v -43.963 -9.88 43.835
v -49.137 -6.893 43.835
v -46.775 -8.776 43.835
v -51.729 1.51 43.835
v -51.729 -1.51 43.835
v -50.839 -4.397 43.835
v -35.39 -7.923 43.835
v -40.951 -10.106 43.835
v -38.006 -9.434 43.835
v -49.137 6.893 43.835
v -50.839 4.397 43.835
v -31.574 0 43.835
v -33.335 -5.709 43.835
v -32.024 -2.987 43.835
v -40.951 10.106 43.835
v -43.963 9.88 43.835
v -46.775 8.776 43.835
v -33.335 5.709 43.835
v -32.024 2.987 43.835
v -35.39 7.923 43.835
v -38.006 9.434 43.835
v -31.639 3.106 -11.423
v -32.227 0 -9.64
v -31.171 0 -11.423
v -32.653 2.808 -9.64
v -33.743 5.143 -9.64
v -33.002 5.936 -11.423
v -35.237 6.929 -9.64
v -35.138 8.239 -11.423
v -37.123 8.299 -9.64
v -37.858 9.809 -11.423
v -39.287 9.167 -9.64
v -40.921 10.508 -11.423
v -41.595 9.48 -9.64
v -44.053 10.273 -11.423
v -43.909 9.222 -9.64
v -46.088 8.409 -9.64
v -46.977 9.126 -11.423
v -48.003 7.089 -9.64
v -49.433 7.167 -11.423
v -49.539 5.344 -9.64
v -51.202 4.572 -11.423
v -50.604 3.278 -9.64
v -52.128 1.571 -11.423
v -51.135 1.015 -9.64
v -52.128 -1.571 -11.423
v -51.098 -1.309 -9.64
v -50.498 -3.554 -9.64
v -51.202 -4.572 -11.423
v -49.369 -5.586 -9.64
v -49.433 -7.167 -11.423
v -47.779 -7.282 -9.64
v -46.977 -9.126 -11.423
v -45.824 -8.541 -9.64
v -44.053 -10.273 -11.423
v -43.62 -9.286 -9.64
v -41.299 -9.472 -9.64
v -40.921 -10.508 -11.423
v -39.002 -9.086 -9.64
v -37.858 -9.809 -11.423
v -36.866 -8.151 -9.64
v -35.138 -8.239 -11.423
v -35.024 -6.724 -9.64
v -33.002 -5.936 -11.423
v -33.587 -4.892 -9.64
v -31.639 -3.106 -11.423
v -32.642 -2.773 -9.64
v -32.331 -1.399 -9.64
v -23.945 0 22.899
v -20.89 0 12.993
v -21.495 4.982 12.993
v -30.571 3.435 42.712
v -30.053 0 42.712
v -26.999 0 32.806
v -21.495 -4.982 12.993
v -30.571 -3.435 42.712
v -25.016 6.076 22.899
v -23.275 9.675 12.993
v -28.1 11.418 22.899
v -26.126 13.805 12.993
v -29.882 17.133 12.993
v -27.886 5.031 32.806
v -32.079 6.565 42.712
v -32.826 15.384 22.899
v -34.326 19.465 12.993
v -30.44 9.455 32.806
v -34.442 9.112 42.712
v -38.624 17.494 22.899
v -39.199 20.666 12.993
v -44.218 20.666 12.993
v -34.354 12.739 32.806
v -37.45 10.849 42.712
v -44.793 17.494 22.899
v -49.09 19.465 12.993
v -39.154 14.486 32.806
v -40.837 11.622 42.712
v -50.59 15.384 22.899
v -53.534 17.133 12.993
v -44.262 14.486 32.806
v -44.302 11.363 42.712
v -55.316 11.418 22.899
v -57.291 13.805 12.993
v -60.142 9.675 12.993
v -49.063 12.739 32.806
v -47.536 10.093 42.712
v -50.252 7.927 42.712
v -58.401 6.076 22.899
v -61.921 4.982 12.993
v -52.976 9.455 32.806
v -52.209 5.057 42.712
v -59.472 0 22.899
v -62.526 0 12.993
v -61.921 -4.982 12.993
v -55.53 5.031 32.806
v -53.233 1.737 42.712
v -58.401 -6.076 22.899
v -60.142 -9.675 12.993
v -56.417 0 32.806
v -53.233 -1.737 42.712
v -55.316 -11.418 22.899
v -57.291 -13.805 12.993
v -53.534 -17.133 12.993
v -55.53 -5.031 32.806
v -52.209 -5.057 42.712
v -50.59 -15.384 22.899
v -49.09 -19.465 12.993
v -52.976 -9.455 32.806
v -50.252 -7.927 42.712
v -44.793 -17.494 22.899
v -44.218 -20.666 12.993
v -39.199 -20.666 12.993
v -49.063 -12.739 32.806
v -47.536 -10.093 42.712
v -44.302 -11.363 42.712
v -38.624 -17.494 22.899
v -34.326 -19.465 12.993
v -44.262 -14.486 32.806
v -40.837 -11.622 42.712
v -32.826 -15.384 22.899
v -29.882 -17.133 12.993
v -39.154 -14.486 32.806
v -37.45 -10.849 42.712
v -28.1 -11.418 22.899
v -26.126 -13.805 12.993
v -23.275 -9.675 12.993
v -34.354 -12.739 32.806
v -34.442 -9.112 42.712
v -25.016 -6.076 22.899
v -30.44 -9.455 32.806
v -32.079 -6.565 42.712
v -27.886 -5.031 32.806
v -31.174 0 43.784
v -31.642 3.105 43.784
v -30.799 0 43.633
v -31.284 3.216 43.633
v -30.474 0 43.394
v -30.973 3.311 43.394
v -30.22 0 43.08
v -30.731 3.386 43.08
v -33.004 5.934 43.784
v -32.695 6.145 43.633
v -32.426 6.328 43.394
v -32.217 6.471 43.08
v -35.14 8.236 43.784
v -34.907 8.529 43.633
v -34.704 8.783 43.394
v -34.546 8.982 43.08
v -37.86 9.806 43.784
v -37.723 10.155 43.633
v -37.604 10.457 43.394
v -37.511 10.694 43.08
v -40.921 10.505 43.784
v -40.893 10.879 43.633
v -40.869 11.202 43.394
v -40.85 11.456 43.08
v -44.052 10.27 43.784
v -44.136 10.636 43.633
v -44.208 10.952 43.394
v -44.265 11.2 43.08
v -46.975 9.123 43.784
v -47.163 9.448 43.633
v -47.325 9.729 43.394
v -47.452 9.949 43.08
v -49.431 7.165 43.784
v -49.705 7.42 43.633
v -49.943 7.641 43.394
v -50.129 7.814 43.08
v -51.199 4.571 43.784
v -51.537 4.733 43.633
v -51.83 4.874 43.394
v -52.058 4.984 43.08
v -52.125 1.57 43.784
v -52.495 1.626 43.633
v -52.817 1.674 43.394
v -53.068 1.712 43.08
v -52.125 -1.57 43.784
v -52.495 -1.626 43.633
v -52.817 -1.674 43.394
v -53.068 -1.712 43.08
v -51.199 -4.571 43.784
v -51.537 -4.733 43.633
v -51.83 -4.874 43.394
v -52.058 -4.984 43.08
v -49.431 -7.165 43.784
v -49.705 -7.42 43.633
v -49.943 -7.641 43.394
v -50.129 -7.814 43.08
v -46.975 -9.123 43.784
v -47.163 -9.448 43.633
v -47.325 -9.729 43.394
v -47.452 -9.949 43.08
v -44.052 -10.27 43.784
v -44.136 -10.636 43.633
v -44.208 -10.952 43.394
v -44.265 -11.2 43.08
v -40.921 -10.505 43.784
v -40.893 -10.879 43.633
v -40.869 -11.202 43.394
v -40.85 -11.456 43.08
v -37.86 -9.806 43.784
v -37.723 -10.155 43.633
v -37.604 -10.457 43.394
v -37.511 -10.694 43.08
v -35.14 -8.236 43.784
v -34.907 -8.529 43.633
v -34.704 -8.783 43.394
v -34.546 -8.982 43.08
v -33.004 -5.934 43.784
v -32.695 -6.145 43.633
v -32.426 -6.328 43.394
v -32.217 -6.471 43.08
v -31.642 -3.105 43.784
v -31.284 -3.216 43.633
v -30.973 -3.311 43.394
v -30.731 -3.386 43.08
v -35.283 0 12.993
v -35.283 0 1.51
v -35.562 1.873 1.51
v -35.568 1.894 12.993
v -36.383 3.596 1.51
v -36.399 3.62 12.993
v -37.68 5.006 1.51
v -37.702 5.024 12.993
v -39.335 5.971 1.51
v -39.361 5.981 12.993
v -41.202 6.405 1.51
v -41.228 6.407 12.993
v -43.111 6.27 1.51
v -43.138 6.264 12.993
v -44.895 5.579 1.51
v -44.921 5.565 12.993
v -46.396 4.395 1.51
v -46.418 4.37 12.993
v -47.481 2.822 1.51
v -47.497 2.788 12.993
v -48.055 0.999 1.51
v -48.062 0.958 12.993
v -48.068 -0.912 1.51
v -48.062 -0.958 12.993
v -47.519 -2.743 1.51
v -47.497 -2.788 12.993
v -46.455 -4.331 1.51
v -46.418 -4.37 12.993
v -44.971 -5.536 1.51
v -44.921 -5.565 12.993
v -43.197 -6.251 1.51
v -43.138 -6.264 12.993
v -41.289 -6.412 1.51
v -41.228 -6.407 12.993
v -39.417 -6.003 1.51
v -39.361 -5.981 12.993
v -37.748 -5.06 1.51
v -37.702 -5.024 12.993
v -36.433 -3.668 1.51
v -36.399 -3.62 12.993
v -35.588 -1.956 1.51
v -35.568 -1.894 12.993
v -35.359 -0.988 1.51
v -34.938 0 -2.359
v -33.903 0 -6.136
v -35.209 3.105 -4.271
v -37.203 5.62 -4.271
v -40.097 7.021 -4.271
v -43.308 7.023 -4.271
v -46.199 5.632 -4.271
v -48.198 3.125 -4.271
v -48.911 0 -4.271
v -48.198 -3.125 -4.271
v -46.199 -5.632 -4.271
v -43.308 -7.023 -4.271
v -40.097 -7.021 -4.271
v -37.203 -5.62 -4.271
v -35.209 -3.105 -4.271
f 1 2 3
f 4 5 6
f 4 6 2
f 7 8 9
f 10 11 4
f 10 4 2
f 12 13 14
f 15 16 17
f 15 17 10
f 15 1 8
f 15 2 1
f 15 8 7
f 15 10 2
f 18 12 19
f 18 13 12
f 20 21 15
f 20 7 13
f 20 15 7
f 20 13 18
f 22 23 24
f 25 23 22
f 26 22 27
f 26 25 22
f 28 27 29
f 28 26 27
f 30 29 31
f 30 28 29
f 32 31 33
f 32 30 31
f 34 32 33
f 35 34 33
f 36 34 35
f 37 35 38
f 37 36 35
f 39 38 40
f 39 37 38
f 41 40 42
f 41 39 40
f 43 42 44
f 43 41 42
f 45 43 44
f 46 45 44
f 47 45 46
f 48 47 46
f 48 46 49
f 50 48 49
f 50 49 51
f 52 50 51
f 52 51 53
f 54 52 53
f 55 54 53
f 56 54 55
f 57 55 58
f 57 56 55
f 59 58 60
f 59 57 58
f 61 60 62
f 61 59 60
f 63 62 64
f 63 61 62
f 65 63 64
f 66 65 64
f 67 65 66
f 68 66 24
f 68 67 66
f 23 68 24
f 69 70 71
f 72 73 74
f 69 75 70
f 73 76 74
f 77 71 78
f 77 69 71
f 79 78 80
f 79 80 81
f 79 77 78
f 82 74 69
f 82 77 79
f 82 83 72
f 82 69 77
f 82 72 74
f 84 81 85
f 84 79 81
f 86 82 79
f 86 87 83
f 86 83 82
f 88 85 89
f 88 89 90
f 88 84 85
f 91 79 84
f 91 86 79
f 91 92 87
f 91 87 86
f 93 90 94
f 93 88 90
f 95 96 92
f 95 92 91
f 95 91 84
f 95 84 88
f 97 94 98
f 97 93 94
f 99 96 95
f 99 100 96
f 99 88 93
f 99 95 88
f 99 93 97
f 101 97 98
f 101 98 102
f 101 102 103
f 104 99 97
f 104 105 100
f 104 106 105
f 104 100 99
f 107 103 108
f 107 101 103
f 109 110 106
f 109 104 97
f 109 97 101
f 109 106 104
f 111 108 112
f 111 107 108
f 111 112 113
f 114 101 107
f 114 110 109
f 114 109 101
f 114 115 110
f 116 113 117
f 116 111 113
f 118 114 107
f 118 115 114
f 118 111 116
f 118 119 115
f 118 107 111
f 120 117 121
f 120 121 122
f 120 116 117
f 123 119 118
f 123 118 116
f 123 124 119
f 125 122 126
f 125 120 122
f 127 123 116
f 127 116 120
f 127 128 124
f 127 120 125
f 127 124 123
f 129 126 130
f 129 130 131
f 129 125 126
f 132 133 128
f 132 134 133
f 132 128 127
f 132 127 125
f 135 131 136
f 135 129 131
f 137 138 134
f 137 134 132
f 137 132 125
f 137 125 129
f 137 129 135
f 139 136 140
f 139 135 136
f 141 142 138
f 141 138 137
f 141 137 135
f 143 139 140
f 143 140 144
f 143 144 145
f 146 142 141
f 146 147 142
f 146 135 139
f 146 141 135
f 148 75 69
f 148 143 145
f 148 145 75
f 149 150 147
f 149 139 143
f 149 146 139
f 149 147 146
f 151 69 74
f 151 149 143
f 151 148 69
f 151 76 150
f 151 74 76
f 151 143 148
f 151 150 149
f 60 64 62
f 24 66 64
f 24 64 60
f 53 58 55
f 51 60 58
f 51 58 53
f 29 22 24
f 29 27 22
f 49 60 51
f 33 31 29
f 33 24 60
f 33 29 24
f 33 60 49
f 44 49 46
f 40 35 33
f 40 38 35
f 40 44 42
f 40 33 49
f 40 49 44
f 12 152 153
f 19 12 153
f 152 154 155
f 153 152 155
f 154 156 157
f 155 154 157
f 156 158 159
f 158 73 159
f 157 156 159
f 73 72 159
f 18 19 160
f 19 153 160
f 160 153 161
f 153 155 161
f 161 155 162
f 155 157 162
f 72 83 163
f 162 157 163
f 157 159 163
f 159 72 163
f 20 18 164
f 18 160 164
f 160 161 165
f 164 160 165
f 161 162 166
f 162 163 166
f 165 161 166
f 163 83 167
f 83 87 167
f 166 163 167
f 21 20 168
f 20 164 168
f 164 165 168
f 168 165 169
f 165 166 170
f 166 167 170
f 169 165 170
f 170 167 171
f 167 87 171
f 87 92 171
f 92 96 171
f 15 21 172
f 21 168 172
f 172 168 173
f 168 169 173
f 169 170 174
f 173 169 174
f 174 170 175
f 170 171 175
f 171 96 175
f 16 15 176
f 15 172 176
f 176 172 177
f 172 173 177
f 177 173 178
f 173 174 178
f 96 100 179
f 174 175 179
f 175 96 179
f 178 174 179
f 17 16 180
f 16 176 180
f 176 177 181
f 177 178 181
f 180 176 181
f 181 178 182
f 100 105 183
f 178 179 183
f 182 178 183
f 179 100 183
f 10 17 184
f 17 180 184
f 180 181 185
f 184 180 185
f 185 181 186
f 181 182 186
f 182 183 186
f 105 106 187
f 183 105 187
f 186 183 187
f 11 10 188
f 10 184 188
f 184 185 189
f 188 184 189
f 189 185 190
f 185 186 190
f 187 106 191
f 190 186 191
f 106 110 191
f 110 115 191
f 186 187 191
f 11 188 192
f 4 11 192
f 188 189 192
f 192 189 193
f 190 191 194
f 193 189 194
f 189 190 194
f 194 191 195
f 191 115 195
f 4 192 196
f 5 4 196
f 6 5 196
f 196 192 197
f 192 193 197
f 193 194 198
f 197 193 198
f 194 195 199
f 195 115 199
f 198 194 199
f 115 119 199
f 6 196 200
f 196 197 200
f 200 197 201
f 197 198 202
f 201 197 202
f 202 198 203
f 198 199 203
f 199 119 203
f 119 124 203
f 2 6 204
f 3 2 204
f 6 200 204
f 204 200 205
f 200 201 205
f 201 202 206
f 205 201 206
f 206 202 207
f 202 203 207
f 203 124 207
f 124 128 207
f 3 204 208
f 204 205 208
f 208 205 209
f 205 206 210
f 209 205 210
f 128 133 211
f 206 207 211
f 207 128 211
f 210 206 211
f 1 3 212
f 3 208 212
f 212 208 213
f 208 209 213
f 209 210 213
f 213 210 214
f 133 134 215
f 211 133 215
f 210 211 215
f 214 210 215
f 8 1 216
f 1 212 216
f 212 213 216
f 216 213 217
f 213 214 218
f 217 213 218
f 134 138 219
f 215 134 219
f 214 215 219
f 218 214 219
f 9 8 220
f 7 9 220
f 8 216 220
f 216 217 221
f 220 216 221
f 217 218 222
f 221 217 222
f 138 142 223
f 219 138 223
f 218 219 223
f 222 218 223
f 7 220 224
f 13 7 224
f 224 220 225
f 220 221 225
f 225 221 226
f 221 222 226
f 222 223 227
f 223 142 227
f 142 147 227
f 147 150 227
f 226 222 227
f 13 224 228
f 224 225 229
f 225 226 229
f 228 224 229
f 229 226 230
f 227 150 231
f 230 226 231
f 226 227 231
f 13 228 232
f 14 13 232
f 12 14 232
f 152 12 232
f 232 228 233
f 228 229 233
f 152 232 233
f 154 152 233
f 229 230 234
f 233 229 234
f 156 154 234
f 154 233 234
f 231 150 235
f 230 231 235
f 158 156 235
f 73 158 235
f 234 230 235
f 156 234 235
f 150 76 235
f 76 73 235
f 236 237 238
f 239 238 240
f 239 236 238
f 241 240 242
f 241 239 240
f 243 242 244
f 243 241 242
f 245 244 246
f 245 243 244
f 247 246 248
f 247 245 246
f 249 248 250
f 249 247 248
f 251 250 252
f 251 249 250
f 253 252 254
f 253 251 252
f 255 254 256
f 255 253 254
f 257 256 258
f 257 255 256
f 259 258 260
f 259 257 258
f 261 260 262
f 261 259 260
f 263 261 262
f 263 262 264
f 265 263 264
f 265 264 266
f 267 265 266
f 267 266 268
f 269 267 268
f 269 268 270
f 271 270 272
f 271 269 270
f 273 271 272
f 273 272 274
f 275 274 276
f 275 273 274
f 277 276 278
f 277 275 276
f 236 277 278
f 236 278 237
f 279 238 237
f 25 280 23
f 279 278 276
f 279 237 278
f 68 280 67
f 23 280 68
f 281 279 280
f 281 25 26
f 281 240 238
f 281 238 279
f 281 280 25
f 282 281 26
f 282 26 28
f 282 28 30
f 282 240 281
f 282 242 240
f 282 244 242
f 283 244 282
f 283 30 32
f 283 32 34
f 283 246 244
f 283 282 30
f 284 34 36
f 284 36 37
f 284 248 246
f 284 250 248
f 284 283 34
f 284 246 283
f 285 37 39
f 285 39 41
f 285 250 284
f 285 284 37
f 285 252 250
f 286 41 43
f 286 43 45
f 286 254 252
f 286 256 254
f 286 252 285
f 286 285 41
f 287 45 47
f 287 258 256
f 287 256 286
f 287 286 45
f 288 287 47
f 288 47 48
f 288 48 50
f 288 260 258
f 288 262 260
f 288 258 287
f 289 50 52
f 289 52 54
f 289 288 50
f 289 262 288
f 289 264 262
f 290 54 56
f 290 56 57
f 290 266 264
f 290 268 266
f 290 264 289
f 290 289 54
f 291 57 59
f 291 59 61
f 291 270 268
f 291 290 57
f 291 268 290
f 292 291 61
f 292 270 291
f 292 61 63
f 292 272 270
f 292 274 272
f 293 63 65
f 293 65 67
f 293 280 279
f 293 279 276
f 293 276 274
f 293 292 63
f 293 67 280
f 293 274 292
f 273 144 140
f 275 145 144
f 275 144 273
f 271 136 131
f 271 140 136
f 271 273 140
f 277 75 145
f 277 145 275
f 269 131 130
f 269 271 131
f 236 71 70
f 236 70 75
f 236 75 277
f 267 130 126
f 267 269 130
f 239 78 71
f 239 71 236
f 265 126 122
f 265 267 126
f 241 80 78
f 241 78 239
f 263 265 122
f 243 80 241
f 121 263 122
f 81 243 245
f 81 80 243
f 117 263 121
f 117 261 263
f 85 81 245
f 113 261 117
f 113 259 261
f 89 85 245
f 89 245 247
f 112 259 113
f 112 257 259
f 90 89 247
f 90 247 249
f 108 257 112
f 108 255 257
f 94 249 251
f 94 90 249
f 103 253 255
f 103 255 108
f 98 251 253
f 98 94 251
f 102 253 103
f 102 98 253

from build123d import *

# Parameters (mm, degrees)
F2_R = 1.5912908075
F3_R = 21.8711796934


with BuildPart() as f1:
    # F0 (on Front) → F1 (revolve)
    with BuildSketch(Plane.XZ):
        Polygon((-30.3995665163, 43.8347905874), (-41.7082160711, 43.8347905874), (-41.7082160711, -11.4233754575), (-31.1706103384, -11.4233754575), (-35.2828465402, -4.483976867), (-35.2828465402, 12.9930237308), (-20.8900216967, 12.9930237308), align=None)
    revolve(axis=Axis((-41.7082160711, 0, 16.2057075649), (0, 0, 1)))

    # F2
    f2_edges = [f1.edges().sort_by_distance(p)[0] for p in [
        (-53.016866, 0, 43.834791),
    ]]
    fillet(f2_edges, radius=F2_R)

    # F3
    f3_edges = [f1.edges().sort_by_distance(p)[0] for p in [
        (-48.133586, 0, -4.483977),
    ]]
    fillet(f3_edges, radius=F3_R)


solid = f1.part
